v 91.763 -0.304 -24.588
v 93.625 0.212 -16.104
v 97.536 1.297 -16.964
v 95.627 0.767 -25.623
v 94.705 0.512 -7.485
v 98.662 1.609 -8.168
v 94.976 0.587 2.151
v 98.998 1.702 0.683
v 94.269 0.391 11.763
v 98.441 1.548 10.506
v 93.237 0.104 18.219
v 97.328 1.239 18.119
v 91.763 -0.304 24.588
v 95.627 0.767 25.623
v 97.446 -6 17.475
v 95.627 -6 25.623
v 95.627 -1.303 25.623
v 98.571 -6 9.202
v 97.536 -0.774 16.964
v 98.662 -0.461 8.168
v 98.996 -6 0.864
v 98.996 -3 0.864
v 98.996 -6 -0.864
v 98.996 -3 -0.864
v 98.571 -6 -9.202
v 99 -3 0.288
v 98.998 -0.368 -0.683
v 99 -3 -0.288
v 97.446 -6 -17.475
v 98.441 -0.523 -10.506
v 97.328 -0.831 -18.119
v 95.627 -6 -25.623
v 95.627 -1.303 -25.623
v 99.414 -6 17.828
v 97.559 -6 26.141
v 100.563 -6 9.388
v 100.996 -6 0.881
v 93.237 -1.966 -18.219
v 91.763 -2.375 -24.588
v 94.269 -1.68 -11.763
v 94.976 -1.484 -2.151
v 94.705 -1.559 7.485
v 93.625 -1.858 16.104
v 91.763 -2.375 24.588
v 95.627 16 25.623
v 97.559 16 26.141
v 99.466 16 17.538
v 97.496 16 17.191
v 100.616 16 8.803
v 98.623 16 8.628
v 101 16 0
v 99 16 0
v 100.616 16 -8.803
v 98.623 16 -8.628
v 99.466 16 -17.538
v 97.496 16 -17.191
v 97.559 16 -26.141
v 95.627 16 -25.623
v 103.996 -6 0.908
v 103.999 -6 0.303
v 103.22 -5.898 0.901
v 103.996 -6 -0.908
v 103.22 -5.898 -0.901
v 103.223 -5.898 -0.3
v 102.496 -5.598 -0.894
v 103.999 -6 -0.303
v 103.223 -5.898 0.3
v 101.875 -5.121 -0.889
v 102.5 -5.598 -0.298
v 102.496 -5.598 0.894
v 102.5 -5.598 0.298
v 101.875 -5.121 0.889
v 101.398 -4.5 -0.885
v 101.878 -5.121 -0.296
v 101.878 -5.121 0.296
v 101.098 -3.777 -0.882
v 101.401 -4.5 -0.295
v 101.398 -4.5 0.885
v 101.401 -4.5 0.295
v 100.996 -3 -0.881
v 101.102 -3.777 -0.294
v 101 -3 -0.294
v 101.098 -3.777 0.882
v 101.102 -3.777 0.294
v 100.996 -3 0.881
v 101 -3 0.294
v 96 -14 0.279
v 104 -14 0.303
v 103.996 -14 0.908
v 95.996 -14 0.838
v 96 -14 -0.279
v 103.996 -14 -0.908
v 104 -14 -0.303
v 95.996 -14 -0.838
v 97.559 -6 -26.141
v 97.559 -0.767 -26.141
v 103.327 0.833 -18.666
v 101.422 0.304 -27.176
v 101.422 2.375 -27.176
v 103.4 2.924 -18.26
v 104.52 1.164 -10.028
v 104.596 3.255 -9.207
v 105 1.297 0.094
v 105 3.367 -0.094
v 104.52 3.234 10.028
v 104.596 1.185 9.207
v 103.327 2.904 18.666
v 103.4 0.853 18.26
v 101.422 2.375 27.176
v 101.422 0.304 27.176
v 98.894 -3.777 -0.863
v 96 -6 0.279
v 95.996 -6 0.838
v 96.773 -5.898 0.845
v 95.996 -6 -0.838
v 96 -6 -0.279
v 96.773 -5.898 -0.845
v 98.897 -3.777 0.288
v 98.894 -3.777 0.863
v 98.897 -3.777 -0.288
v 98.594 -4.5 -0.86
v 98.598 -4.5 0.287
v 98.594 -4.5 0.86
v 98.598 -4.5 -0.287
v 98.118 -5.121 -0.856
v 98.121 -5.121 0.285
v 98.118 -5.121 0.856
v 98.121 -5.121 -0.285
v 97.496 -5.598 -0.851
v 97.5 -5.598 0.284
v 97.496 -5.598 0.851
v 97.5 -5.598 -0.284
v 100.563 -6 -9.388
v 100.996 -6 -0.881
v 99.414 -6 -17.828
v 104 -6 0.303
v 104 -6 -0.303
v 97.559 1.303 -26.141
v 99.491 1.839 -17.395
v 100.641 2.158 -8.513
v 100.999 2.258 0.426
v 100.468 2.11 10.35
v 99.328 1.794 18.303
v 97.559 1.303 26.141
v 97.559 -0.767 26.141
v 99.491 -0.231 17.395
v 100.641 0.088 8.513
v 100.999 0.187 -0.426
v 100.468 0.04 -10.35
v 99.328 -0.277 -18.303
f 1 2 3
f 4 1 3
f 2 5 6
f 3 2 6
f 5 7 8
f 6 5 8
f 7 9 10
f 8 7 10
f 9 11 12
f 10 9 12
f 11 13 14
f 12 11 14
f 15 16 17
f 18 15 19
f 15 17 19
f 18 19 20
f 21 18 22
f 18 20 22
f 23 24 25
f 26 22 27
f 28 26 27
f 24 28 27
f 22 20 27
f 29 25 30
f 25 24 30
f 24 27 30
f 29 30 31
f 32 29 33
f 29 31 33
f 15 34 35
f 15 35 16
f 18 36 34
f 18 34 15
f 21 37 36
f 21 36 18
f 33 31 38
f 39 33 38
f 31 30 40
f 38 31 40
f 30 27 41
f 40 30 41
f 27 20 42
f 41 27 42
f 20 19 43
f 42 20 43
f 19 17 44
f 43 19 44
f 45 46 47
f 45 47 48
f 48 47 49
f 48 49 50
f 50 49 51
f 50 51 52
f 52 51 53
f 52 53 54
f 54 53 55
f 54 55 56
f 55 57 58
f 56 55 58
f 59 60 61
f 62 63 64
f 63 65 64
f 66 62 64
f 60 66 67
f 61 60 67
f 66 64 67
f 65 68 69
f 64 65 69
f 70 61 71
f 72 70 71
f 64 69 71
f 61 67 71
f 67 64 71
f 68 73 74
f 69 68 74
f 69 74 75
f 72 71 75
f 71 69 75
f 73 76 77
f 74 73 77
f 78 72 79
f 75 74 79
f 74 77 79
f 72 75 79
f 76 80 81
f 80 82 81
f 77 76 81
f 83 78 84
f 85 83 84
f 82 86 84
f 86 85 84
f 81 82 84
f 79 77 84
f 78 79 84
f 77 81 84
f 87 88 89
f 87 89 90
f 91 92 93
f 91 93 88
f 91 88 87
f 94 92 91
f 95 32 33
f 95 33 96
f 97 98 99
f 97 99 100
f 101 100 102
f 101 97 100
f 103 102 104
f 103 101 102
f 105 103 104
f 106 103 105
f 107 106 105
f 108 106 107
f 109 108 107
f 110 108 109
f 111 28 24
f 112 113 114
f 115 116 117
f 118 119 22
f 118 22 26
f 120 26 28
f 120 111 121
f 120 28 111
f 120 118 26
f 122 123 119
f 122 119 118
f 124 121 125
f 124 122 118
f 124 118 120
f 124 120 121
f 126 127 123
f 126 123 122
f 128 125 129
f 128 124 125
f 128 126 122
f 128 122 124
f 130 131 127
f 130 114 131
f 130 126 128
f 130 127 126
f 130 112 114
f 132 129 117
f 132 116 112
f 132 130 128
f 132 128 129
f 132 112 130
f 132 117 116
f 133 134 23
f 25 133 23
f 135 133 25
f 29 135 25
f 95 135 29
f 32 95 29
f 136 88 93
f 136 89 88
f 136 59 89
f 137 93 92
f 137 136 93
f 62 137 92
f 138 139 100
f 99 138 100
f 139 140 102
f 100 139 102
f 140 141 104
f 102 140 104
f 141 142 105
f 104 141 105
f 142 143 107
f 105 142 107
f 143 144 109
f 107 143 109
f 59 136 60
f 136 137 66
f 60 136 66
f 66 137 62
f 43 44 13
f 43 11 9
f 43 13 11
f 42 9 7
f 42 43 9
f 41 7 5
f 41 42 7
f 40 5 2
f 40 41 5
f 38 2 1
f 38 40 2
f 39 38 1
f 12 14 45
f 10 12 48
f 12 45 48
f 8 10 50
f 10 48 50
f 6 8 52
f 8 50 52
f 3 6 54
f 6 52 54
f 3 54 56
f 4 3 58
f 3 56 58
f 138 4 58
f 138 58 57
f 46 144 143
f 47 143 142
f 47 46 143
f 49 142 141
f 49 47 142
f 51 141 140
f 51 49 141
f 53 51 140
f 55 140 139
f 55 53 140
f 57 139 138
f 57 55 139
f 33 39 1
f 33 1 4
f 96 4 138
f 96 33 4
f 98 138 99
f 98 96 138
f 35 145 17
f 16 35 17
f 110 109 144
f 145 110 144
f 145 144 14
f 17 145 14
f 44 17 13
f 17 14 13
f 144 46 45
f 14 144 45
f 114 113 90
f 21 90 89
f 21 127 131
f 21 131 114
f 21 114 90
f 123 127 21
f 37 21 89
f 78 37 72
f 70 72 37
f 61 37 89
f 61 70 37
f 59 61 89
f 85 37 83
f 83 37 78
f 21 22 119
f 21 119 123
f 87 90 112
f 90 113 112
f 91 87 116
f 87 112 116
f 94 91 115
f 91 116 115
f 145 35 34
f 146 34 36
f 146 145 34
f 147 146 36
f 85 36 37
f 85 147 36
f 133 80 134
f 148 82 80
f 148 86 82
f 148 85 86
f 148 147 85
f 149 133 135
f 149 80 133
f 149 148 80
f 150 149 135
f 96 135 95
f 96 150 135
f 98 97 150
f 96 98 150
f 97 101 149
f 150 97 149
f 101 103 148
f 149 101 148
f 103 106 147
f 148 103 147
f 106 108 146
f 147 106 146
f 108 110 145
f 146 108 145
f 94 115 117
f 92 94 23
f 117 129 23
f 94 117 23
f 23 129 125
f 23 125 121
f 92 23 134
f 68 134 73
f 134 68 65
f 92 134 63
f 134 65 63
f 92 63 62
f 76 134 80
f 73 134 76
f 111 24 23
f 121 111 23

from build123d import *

# Parameters (mm, degrees)
SKETCH1_W           = 2
SKETCH1_H           = 22
REVOLVE1_ANGLE      = 30
BOSS_EXTRUDE2_DEPTH = 57
CUT_EXTRUDE1_START  = -6.211657082
CUT_EXTRUDE1_DEPTH  = 12.423314164
SKETCH16_W          = 8
SKETCH16_H          = 8
REVOLVE2_ANGLE      = 1
FILLET2_R           = 3


# Read off the part's stored shape, not the designer's step: Cut-Extrude1
with BuildPart() as part:
    # Sketch1 → Revolve1 (revolve, symmetric)
    with BuildSketch(Plane.XY) as revolve1_sk:
        with Locations((100, 5)):
            Rectangle(SKETCH1_W, SKETCH1_H)
    revolve(axis=Axis((0, 12.85, 0), (0, -1, 0)), revolution_arc=REVOLVE1_ANGLE / 2)
    revolve(revolve1_sk.sketch, axis=Axis((0, 12.85, 0), (0, 1, 0)), revolution_arc=REVOLVE1_ANGLE / 2)

    # Sketch13 → Boss-Extrude2 (add, along a direction that is not the sketch's normal)
    with BuildSketch(Plane(origin=(0, 0, 0), x_dir=(0.9659258262890682, 0, 0.25881904510252124), z_dir=(-0.25881904510252124, 0, 0.9659258262890682))):
        Polygon((80.681483474, -4.141104722), (119.318516526, 6.211657082), (119.318516526, 4.141104722), (80.681483474, -6.211657082), align=None)
    extrude(amount=-BOSS_EXTRUDE2_DEPTH, dir=(0, 0, 1))

    # Cut-Extrude1 outline → Cut-Extrude1 (cut)
    with BuildSketch(Plane(origin=(0, 0, 0), x_dir=(1, 0, 0), z_dir=(0, 1, 0)).offset(CUT_EXTRUDE1_START)):
        with BuildLine():
            Line((91.762953497, 24.587809285), (101.42221176, 27.175999736))
            ThreePointArc((101.42221176, 27.175999736), (105, 0), (101.42221176, -27.175999736))
            Line((101.42221176, -27.175999736), (115.252836667, -30.88190451))
            Line((115.252836667, -30.88190451), (115.252836667, 26.11809549))
            Line((115.252836667, 26.11809549), (77.932328591, 36.11809549))
            Line((77.932328591, 36.11809549), (77.932328591, -20.88190451))
            Line((77.932328591, -20.88190451), (91.762953497, -24.587809285))
            ThreePointArc((91.762953497, -24.587809285), (95, 0), (91.762953497, 24.587809285))
        make_face()
    extrude(amount=CUT_EXTRUDE1_DEPTH, mode=Mode.SUBTRACT)

    # Sketch16 → Revolve2 (revolve, symmetric)
    with BuildSketch(Plane.XY) as revolve2_sk:
        with Locations((100, -10)):
            Rectangle(SKETCH16_W, SKETCH16_H)
    revolve(axis=Axis((0, 12.85, 0), (0, -1, 0)), revolution_arc=REVOLVE2_ANGLE / 2)
    revolve(revolve2_sk.sketch, axis=Axis((0, 12.85, 0), (0, 1, 0)), revolution_arc=REVOLVE2_ANGLE / 2)

    # Fillet2
    fillet2_edges = [part.edges().sort_by_distance(p)[0] for p in [
        (99, -6, 0),
        (101, -6, 0),
    ]]
    fillet(fillet2_edges, radius=FILLET2_R - 0.0001)  # a hair under: the kernel refuses the full size


solid = part.part
